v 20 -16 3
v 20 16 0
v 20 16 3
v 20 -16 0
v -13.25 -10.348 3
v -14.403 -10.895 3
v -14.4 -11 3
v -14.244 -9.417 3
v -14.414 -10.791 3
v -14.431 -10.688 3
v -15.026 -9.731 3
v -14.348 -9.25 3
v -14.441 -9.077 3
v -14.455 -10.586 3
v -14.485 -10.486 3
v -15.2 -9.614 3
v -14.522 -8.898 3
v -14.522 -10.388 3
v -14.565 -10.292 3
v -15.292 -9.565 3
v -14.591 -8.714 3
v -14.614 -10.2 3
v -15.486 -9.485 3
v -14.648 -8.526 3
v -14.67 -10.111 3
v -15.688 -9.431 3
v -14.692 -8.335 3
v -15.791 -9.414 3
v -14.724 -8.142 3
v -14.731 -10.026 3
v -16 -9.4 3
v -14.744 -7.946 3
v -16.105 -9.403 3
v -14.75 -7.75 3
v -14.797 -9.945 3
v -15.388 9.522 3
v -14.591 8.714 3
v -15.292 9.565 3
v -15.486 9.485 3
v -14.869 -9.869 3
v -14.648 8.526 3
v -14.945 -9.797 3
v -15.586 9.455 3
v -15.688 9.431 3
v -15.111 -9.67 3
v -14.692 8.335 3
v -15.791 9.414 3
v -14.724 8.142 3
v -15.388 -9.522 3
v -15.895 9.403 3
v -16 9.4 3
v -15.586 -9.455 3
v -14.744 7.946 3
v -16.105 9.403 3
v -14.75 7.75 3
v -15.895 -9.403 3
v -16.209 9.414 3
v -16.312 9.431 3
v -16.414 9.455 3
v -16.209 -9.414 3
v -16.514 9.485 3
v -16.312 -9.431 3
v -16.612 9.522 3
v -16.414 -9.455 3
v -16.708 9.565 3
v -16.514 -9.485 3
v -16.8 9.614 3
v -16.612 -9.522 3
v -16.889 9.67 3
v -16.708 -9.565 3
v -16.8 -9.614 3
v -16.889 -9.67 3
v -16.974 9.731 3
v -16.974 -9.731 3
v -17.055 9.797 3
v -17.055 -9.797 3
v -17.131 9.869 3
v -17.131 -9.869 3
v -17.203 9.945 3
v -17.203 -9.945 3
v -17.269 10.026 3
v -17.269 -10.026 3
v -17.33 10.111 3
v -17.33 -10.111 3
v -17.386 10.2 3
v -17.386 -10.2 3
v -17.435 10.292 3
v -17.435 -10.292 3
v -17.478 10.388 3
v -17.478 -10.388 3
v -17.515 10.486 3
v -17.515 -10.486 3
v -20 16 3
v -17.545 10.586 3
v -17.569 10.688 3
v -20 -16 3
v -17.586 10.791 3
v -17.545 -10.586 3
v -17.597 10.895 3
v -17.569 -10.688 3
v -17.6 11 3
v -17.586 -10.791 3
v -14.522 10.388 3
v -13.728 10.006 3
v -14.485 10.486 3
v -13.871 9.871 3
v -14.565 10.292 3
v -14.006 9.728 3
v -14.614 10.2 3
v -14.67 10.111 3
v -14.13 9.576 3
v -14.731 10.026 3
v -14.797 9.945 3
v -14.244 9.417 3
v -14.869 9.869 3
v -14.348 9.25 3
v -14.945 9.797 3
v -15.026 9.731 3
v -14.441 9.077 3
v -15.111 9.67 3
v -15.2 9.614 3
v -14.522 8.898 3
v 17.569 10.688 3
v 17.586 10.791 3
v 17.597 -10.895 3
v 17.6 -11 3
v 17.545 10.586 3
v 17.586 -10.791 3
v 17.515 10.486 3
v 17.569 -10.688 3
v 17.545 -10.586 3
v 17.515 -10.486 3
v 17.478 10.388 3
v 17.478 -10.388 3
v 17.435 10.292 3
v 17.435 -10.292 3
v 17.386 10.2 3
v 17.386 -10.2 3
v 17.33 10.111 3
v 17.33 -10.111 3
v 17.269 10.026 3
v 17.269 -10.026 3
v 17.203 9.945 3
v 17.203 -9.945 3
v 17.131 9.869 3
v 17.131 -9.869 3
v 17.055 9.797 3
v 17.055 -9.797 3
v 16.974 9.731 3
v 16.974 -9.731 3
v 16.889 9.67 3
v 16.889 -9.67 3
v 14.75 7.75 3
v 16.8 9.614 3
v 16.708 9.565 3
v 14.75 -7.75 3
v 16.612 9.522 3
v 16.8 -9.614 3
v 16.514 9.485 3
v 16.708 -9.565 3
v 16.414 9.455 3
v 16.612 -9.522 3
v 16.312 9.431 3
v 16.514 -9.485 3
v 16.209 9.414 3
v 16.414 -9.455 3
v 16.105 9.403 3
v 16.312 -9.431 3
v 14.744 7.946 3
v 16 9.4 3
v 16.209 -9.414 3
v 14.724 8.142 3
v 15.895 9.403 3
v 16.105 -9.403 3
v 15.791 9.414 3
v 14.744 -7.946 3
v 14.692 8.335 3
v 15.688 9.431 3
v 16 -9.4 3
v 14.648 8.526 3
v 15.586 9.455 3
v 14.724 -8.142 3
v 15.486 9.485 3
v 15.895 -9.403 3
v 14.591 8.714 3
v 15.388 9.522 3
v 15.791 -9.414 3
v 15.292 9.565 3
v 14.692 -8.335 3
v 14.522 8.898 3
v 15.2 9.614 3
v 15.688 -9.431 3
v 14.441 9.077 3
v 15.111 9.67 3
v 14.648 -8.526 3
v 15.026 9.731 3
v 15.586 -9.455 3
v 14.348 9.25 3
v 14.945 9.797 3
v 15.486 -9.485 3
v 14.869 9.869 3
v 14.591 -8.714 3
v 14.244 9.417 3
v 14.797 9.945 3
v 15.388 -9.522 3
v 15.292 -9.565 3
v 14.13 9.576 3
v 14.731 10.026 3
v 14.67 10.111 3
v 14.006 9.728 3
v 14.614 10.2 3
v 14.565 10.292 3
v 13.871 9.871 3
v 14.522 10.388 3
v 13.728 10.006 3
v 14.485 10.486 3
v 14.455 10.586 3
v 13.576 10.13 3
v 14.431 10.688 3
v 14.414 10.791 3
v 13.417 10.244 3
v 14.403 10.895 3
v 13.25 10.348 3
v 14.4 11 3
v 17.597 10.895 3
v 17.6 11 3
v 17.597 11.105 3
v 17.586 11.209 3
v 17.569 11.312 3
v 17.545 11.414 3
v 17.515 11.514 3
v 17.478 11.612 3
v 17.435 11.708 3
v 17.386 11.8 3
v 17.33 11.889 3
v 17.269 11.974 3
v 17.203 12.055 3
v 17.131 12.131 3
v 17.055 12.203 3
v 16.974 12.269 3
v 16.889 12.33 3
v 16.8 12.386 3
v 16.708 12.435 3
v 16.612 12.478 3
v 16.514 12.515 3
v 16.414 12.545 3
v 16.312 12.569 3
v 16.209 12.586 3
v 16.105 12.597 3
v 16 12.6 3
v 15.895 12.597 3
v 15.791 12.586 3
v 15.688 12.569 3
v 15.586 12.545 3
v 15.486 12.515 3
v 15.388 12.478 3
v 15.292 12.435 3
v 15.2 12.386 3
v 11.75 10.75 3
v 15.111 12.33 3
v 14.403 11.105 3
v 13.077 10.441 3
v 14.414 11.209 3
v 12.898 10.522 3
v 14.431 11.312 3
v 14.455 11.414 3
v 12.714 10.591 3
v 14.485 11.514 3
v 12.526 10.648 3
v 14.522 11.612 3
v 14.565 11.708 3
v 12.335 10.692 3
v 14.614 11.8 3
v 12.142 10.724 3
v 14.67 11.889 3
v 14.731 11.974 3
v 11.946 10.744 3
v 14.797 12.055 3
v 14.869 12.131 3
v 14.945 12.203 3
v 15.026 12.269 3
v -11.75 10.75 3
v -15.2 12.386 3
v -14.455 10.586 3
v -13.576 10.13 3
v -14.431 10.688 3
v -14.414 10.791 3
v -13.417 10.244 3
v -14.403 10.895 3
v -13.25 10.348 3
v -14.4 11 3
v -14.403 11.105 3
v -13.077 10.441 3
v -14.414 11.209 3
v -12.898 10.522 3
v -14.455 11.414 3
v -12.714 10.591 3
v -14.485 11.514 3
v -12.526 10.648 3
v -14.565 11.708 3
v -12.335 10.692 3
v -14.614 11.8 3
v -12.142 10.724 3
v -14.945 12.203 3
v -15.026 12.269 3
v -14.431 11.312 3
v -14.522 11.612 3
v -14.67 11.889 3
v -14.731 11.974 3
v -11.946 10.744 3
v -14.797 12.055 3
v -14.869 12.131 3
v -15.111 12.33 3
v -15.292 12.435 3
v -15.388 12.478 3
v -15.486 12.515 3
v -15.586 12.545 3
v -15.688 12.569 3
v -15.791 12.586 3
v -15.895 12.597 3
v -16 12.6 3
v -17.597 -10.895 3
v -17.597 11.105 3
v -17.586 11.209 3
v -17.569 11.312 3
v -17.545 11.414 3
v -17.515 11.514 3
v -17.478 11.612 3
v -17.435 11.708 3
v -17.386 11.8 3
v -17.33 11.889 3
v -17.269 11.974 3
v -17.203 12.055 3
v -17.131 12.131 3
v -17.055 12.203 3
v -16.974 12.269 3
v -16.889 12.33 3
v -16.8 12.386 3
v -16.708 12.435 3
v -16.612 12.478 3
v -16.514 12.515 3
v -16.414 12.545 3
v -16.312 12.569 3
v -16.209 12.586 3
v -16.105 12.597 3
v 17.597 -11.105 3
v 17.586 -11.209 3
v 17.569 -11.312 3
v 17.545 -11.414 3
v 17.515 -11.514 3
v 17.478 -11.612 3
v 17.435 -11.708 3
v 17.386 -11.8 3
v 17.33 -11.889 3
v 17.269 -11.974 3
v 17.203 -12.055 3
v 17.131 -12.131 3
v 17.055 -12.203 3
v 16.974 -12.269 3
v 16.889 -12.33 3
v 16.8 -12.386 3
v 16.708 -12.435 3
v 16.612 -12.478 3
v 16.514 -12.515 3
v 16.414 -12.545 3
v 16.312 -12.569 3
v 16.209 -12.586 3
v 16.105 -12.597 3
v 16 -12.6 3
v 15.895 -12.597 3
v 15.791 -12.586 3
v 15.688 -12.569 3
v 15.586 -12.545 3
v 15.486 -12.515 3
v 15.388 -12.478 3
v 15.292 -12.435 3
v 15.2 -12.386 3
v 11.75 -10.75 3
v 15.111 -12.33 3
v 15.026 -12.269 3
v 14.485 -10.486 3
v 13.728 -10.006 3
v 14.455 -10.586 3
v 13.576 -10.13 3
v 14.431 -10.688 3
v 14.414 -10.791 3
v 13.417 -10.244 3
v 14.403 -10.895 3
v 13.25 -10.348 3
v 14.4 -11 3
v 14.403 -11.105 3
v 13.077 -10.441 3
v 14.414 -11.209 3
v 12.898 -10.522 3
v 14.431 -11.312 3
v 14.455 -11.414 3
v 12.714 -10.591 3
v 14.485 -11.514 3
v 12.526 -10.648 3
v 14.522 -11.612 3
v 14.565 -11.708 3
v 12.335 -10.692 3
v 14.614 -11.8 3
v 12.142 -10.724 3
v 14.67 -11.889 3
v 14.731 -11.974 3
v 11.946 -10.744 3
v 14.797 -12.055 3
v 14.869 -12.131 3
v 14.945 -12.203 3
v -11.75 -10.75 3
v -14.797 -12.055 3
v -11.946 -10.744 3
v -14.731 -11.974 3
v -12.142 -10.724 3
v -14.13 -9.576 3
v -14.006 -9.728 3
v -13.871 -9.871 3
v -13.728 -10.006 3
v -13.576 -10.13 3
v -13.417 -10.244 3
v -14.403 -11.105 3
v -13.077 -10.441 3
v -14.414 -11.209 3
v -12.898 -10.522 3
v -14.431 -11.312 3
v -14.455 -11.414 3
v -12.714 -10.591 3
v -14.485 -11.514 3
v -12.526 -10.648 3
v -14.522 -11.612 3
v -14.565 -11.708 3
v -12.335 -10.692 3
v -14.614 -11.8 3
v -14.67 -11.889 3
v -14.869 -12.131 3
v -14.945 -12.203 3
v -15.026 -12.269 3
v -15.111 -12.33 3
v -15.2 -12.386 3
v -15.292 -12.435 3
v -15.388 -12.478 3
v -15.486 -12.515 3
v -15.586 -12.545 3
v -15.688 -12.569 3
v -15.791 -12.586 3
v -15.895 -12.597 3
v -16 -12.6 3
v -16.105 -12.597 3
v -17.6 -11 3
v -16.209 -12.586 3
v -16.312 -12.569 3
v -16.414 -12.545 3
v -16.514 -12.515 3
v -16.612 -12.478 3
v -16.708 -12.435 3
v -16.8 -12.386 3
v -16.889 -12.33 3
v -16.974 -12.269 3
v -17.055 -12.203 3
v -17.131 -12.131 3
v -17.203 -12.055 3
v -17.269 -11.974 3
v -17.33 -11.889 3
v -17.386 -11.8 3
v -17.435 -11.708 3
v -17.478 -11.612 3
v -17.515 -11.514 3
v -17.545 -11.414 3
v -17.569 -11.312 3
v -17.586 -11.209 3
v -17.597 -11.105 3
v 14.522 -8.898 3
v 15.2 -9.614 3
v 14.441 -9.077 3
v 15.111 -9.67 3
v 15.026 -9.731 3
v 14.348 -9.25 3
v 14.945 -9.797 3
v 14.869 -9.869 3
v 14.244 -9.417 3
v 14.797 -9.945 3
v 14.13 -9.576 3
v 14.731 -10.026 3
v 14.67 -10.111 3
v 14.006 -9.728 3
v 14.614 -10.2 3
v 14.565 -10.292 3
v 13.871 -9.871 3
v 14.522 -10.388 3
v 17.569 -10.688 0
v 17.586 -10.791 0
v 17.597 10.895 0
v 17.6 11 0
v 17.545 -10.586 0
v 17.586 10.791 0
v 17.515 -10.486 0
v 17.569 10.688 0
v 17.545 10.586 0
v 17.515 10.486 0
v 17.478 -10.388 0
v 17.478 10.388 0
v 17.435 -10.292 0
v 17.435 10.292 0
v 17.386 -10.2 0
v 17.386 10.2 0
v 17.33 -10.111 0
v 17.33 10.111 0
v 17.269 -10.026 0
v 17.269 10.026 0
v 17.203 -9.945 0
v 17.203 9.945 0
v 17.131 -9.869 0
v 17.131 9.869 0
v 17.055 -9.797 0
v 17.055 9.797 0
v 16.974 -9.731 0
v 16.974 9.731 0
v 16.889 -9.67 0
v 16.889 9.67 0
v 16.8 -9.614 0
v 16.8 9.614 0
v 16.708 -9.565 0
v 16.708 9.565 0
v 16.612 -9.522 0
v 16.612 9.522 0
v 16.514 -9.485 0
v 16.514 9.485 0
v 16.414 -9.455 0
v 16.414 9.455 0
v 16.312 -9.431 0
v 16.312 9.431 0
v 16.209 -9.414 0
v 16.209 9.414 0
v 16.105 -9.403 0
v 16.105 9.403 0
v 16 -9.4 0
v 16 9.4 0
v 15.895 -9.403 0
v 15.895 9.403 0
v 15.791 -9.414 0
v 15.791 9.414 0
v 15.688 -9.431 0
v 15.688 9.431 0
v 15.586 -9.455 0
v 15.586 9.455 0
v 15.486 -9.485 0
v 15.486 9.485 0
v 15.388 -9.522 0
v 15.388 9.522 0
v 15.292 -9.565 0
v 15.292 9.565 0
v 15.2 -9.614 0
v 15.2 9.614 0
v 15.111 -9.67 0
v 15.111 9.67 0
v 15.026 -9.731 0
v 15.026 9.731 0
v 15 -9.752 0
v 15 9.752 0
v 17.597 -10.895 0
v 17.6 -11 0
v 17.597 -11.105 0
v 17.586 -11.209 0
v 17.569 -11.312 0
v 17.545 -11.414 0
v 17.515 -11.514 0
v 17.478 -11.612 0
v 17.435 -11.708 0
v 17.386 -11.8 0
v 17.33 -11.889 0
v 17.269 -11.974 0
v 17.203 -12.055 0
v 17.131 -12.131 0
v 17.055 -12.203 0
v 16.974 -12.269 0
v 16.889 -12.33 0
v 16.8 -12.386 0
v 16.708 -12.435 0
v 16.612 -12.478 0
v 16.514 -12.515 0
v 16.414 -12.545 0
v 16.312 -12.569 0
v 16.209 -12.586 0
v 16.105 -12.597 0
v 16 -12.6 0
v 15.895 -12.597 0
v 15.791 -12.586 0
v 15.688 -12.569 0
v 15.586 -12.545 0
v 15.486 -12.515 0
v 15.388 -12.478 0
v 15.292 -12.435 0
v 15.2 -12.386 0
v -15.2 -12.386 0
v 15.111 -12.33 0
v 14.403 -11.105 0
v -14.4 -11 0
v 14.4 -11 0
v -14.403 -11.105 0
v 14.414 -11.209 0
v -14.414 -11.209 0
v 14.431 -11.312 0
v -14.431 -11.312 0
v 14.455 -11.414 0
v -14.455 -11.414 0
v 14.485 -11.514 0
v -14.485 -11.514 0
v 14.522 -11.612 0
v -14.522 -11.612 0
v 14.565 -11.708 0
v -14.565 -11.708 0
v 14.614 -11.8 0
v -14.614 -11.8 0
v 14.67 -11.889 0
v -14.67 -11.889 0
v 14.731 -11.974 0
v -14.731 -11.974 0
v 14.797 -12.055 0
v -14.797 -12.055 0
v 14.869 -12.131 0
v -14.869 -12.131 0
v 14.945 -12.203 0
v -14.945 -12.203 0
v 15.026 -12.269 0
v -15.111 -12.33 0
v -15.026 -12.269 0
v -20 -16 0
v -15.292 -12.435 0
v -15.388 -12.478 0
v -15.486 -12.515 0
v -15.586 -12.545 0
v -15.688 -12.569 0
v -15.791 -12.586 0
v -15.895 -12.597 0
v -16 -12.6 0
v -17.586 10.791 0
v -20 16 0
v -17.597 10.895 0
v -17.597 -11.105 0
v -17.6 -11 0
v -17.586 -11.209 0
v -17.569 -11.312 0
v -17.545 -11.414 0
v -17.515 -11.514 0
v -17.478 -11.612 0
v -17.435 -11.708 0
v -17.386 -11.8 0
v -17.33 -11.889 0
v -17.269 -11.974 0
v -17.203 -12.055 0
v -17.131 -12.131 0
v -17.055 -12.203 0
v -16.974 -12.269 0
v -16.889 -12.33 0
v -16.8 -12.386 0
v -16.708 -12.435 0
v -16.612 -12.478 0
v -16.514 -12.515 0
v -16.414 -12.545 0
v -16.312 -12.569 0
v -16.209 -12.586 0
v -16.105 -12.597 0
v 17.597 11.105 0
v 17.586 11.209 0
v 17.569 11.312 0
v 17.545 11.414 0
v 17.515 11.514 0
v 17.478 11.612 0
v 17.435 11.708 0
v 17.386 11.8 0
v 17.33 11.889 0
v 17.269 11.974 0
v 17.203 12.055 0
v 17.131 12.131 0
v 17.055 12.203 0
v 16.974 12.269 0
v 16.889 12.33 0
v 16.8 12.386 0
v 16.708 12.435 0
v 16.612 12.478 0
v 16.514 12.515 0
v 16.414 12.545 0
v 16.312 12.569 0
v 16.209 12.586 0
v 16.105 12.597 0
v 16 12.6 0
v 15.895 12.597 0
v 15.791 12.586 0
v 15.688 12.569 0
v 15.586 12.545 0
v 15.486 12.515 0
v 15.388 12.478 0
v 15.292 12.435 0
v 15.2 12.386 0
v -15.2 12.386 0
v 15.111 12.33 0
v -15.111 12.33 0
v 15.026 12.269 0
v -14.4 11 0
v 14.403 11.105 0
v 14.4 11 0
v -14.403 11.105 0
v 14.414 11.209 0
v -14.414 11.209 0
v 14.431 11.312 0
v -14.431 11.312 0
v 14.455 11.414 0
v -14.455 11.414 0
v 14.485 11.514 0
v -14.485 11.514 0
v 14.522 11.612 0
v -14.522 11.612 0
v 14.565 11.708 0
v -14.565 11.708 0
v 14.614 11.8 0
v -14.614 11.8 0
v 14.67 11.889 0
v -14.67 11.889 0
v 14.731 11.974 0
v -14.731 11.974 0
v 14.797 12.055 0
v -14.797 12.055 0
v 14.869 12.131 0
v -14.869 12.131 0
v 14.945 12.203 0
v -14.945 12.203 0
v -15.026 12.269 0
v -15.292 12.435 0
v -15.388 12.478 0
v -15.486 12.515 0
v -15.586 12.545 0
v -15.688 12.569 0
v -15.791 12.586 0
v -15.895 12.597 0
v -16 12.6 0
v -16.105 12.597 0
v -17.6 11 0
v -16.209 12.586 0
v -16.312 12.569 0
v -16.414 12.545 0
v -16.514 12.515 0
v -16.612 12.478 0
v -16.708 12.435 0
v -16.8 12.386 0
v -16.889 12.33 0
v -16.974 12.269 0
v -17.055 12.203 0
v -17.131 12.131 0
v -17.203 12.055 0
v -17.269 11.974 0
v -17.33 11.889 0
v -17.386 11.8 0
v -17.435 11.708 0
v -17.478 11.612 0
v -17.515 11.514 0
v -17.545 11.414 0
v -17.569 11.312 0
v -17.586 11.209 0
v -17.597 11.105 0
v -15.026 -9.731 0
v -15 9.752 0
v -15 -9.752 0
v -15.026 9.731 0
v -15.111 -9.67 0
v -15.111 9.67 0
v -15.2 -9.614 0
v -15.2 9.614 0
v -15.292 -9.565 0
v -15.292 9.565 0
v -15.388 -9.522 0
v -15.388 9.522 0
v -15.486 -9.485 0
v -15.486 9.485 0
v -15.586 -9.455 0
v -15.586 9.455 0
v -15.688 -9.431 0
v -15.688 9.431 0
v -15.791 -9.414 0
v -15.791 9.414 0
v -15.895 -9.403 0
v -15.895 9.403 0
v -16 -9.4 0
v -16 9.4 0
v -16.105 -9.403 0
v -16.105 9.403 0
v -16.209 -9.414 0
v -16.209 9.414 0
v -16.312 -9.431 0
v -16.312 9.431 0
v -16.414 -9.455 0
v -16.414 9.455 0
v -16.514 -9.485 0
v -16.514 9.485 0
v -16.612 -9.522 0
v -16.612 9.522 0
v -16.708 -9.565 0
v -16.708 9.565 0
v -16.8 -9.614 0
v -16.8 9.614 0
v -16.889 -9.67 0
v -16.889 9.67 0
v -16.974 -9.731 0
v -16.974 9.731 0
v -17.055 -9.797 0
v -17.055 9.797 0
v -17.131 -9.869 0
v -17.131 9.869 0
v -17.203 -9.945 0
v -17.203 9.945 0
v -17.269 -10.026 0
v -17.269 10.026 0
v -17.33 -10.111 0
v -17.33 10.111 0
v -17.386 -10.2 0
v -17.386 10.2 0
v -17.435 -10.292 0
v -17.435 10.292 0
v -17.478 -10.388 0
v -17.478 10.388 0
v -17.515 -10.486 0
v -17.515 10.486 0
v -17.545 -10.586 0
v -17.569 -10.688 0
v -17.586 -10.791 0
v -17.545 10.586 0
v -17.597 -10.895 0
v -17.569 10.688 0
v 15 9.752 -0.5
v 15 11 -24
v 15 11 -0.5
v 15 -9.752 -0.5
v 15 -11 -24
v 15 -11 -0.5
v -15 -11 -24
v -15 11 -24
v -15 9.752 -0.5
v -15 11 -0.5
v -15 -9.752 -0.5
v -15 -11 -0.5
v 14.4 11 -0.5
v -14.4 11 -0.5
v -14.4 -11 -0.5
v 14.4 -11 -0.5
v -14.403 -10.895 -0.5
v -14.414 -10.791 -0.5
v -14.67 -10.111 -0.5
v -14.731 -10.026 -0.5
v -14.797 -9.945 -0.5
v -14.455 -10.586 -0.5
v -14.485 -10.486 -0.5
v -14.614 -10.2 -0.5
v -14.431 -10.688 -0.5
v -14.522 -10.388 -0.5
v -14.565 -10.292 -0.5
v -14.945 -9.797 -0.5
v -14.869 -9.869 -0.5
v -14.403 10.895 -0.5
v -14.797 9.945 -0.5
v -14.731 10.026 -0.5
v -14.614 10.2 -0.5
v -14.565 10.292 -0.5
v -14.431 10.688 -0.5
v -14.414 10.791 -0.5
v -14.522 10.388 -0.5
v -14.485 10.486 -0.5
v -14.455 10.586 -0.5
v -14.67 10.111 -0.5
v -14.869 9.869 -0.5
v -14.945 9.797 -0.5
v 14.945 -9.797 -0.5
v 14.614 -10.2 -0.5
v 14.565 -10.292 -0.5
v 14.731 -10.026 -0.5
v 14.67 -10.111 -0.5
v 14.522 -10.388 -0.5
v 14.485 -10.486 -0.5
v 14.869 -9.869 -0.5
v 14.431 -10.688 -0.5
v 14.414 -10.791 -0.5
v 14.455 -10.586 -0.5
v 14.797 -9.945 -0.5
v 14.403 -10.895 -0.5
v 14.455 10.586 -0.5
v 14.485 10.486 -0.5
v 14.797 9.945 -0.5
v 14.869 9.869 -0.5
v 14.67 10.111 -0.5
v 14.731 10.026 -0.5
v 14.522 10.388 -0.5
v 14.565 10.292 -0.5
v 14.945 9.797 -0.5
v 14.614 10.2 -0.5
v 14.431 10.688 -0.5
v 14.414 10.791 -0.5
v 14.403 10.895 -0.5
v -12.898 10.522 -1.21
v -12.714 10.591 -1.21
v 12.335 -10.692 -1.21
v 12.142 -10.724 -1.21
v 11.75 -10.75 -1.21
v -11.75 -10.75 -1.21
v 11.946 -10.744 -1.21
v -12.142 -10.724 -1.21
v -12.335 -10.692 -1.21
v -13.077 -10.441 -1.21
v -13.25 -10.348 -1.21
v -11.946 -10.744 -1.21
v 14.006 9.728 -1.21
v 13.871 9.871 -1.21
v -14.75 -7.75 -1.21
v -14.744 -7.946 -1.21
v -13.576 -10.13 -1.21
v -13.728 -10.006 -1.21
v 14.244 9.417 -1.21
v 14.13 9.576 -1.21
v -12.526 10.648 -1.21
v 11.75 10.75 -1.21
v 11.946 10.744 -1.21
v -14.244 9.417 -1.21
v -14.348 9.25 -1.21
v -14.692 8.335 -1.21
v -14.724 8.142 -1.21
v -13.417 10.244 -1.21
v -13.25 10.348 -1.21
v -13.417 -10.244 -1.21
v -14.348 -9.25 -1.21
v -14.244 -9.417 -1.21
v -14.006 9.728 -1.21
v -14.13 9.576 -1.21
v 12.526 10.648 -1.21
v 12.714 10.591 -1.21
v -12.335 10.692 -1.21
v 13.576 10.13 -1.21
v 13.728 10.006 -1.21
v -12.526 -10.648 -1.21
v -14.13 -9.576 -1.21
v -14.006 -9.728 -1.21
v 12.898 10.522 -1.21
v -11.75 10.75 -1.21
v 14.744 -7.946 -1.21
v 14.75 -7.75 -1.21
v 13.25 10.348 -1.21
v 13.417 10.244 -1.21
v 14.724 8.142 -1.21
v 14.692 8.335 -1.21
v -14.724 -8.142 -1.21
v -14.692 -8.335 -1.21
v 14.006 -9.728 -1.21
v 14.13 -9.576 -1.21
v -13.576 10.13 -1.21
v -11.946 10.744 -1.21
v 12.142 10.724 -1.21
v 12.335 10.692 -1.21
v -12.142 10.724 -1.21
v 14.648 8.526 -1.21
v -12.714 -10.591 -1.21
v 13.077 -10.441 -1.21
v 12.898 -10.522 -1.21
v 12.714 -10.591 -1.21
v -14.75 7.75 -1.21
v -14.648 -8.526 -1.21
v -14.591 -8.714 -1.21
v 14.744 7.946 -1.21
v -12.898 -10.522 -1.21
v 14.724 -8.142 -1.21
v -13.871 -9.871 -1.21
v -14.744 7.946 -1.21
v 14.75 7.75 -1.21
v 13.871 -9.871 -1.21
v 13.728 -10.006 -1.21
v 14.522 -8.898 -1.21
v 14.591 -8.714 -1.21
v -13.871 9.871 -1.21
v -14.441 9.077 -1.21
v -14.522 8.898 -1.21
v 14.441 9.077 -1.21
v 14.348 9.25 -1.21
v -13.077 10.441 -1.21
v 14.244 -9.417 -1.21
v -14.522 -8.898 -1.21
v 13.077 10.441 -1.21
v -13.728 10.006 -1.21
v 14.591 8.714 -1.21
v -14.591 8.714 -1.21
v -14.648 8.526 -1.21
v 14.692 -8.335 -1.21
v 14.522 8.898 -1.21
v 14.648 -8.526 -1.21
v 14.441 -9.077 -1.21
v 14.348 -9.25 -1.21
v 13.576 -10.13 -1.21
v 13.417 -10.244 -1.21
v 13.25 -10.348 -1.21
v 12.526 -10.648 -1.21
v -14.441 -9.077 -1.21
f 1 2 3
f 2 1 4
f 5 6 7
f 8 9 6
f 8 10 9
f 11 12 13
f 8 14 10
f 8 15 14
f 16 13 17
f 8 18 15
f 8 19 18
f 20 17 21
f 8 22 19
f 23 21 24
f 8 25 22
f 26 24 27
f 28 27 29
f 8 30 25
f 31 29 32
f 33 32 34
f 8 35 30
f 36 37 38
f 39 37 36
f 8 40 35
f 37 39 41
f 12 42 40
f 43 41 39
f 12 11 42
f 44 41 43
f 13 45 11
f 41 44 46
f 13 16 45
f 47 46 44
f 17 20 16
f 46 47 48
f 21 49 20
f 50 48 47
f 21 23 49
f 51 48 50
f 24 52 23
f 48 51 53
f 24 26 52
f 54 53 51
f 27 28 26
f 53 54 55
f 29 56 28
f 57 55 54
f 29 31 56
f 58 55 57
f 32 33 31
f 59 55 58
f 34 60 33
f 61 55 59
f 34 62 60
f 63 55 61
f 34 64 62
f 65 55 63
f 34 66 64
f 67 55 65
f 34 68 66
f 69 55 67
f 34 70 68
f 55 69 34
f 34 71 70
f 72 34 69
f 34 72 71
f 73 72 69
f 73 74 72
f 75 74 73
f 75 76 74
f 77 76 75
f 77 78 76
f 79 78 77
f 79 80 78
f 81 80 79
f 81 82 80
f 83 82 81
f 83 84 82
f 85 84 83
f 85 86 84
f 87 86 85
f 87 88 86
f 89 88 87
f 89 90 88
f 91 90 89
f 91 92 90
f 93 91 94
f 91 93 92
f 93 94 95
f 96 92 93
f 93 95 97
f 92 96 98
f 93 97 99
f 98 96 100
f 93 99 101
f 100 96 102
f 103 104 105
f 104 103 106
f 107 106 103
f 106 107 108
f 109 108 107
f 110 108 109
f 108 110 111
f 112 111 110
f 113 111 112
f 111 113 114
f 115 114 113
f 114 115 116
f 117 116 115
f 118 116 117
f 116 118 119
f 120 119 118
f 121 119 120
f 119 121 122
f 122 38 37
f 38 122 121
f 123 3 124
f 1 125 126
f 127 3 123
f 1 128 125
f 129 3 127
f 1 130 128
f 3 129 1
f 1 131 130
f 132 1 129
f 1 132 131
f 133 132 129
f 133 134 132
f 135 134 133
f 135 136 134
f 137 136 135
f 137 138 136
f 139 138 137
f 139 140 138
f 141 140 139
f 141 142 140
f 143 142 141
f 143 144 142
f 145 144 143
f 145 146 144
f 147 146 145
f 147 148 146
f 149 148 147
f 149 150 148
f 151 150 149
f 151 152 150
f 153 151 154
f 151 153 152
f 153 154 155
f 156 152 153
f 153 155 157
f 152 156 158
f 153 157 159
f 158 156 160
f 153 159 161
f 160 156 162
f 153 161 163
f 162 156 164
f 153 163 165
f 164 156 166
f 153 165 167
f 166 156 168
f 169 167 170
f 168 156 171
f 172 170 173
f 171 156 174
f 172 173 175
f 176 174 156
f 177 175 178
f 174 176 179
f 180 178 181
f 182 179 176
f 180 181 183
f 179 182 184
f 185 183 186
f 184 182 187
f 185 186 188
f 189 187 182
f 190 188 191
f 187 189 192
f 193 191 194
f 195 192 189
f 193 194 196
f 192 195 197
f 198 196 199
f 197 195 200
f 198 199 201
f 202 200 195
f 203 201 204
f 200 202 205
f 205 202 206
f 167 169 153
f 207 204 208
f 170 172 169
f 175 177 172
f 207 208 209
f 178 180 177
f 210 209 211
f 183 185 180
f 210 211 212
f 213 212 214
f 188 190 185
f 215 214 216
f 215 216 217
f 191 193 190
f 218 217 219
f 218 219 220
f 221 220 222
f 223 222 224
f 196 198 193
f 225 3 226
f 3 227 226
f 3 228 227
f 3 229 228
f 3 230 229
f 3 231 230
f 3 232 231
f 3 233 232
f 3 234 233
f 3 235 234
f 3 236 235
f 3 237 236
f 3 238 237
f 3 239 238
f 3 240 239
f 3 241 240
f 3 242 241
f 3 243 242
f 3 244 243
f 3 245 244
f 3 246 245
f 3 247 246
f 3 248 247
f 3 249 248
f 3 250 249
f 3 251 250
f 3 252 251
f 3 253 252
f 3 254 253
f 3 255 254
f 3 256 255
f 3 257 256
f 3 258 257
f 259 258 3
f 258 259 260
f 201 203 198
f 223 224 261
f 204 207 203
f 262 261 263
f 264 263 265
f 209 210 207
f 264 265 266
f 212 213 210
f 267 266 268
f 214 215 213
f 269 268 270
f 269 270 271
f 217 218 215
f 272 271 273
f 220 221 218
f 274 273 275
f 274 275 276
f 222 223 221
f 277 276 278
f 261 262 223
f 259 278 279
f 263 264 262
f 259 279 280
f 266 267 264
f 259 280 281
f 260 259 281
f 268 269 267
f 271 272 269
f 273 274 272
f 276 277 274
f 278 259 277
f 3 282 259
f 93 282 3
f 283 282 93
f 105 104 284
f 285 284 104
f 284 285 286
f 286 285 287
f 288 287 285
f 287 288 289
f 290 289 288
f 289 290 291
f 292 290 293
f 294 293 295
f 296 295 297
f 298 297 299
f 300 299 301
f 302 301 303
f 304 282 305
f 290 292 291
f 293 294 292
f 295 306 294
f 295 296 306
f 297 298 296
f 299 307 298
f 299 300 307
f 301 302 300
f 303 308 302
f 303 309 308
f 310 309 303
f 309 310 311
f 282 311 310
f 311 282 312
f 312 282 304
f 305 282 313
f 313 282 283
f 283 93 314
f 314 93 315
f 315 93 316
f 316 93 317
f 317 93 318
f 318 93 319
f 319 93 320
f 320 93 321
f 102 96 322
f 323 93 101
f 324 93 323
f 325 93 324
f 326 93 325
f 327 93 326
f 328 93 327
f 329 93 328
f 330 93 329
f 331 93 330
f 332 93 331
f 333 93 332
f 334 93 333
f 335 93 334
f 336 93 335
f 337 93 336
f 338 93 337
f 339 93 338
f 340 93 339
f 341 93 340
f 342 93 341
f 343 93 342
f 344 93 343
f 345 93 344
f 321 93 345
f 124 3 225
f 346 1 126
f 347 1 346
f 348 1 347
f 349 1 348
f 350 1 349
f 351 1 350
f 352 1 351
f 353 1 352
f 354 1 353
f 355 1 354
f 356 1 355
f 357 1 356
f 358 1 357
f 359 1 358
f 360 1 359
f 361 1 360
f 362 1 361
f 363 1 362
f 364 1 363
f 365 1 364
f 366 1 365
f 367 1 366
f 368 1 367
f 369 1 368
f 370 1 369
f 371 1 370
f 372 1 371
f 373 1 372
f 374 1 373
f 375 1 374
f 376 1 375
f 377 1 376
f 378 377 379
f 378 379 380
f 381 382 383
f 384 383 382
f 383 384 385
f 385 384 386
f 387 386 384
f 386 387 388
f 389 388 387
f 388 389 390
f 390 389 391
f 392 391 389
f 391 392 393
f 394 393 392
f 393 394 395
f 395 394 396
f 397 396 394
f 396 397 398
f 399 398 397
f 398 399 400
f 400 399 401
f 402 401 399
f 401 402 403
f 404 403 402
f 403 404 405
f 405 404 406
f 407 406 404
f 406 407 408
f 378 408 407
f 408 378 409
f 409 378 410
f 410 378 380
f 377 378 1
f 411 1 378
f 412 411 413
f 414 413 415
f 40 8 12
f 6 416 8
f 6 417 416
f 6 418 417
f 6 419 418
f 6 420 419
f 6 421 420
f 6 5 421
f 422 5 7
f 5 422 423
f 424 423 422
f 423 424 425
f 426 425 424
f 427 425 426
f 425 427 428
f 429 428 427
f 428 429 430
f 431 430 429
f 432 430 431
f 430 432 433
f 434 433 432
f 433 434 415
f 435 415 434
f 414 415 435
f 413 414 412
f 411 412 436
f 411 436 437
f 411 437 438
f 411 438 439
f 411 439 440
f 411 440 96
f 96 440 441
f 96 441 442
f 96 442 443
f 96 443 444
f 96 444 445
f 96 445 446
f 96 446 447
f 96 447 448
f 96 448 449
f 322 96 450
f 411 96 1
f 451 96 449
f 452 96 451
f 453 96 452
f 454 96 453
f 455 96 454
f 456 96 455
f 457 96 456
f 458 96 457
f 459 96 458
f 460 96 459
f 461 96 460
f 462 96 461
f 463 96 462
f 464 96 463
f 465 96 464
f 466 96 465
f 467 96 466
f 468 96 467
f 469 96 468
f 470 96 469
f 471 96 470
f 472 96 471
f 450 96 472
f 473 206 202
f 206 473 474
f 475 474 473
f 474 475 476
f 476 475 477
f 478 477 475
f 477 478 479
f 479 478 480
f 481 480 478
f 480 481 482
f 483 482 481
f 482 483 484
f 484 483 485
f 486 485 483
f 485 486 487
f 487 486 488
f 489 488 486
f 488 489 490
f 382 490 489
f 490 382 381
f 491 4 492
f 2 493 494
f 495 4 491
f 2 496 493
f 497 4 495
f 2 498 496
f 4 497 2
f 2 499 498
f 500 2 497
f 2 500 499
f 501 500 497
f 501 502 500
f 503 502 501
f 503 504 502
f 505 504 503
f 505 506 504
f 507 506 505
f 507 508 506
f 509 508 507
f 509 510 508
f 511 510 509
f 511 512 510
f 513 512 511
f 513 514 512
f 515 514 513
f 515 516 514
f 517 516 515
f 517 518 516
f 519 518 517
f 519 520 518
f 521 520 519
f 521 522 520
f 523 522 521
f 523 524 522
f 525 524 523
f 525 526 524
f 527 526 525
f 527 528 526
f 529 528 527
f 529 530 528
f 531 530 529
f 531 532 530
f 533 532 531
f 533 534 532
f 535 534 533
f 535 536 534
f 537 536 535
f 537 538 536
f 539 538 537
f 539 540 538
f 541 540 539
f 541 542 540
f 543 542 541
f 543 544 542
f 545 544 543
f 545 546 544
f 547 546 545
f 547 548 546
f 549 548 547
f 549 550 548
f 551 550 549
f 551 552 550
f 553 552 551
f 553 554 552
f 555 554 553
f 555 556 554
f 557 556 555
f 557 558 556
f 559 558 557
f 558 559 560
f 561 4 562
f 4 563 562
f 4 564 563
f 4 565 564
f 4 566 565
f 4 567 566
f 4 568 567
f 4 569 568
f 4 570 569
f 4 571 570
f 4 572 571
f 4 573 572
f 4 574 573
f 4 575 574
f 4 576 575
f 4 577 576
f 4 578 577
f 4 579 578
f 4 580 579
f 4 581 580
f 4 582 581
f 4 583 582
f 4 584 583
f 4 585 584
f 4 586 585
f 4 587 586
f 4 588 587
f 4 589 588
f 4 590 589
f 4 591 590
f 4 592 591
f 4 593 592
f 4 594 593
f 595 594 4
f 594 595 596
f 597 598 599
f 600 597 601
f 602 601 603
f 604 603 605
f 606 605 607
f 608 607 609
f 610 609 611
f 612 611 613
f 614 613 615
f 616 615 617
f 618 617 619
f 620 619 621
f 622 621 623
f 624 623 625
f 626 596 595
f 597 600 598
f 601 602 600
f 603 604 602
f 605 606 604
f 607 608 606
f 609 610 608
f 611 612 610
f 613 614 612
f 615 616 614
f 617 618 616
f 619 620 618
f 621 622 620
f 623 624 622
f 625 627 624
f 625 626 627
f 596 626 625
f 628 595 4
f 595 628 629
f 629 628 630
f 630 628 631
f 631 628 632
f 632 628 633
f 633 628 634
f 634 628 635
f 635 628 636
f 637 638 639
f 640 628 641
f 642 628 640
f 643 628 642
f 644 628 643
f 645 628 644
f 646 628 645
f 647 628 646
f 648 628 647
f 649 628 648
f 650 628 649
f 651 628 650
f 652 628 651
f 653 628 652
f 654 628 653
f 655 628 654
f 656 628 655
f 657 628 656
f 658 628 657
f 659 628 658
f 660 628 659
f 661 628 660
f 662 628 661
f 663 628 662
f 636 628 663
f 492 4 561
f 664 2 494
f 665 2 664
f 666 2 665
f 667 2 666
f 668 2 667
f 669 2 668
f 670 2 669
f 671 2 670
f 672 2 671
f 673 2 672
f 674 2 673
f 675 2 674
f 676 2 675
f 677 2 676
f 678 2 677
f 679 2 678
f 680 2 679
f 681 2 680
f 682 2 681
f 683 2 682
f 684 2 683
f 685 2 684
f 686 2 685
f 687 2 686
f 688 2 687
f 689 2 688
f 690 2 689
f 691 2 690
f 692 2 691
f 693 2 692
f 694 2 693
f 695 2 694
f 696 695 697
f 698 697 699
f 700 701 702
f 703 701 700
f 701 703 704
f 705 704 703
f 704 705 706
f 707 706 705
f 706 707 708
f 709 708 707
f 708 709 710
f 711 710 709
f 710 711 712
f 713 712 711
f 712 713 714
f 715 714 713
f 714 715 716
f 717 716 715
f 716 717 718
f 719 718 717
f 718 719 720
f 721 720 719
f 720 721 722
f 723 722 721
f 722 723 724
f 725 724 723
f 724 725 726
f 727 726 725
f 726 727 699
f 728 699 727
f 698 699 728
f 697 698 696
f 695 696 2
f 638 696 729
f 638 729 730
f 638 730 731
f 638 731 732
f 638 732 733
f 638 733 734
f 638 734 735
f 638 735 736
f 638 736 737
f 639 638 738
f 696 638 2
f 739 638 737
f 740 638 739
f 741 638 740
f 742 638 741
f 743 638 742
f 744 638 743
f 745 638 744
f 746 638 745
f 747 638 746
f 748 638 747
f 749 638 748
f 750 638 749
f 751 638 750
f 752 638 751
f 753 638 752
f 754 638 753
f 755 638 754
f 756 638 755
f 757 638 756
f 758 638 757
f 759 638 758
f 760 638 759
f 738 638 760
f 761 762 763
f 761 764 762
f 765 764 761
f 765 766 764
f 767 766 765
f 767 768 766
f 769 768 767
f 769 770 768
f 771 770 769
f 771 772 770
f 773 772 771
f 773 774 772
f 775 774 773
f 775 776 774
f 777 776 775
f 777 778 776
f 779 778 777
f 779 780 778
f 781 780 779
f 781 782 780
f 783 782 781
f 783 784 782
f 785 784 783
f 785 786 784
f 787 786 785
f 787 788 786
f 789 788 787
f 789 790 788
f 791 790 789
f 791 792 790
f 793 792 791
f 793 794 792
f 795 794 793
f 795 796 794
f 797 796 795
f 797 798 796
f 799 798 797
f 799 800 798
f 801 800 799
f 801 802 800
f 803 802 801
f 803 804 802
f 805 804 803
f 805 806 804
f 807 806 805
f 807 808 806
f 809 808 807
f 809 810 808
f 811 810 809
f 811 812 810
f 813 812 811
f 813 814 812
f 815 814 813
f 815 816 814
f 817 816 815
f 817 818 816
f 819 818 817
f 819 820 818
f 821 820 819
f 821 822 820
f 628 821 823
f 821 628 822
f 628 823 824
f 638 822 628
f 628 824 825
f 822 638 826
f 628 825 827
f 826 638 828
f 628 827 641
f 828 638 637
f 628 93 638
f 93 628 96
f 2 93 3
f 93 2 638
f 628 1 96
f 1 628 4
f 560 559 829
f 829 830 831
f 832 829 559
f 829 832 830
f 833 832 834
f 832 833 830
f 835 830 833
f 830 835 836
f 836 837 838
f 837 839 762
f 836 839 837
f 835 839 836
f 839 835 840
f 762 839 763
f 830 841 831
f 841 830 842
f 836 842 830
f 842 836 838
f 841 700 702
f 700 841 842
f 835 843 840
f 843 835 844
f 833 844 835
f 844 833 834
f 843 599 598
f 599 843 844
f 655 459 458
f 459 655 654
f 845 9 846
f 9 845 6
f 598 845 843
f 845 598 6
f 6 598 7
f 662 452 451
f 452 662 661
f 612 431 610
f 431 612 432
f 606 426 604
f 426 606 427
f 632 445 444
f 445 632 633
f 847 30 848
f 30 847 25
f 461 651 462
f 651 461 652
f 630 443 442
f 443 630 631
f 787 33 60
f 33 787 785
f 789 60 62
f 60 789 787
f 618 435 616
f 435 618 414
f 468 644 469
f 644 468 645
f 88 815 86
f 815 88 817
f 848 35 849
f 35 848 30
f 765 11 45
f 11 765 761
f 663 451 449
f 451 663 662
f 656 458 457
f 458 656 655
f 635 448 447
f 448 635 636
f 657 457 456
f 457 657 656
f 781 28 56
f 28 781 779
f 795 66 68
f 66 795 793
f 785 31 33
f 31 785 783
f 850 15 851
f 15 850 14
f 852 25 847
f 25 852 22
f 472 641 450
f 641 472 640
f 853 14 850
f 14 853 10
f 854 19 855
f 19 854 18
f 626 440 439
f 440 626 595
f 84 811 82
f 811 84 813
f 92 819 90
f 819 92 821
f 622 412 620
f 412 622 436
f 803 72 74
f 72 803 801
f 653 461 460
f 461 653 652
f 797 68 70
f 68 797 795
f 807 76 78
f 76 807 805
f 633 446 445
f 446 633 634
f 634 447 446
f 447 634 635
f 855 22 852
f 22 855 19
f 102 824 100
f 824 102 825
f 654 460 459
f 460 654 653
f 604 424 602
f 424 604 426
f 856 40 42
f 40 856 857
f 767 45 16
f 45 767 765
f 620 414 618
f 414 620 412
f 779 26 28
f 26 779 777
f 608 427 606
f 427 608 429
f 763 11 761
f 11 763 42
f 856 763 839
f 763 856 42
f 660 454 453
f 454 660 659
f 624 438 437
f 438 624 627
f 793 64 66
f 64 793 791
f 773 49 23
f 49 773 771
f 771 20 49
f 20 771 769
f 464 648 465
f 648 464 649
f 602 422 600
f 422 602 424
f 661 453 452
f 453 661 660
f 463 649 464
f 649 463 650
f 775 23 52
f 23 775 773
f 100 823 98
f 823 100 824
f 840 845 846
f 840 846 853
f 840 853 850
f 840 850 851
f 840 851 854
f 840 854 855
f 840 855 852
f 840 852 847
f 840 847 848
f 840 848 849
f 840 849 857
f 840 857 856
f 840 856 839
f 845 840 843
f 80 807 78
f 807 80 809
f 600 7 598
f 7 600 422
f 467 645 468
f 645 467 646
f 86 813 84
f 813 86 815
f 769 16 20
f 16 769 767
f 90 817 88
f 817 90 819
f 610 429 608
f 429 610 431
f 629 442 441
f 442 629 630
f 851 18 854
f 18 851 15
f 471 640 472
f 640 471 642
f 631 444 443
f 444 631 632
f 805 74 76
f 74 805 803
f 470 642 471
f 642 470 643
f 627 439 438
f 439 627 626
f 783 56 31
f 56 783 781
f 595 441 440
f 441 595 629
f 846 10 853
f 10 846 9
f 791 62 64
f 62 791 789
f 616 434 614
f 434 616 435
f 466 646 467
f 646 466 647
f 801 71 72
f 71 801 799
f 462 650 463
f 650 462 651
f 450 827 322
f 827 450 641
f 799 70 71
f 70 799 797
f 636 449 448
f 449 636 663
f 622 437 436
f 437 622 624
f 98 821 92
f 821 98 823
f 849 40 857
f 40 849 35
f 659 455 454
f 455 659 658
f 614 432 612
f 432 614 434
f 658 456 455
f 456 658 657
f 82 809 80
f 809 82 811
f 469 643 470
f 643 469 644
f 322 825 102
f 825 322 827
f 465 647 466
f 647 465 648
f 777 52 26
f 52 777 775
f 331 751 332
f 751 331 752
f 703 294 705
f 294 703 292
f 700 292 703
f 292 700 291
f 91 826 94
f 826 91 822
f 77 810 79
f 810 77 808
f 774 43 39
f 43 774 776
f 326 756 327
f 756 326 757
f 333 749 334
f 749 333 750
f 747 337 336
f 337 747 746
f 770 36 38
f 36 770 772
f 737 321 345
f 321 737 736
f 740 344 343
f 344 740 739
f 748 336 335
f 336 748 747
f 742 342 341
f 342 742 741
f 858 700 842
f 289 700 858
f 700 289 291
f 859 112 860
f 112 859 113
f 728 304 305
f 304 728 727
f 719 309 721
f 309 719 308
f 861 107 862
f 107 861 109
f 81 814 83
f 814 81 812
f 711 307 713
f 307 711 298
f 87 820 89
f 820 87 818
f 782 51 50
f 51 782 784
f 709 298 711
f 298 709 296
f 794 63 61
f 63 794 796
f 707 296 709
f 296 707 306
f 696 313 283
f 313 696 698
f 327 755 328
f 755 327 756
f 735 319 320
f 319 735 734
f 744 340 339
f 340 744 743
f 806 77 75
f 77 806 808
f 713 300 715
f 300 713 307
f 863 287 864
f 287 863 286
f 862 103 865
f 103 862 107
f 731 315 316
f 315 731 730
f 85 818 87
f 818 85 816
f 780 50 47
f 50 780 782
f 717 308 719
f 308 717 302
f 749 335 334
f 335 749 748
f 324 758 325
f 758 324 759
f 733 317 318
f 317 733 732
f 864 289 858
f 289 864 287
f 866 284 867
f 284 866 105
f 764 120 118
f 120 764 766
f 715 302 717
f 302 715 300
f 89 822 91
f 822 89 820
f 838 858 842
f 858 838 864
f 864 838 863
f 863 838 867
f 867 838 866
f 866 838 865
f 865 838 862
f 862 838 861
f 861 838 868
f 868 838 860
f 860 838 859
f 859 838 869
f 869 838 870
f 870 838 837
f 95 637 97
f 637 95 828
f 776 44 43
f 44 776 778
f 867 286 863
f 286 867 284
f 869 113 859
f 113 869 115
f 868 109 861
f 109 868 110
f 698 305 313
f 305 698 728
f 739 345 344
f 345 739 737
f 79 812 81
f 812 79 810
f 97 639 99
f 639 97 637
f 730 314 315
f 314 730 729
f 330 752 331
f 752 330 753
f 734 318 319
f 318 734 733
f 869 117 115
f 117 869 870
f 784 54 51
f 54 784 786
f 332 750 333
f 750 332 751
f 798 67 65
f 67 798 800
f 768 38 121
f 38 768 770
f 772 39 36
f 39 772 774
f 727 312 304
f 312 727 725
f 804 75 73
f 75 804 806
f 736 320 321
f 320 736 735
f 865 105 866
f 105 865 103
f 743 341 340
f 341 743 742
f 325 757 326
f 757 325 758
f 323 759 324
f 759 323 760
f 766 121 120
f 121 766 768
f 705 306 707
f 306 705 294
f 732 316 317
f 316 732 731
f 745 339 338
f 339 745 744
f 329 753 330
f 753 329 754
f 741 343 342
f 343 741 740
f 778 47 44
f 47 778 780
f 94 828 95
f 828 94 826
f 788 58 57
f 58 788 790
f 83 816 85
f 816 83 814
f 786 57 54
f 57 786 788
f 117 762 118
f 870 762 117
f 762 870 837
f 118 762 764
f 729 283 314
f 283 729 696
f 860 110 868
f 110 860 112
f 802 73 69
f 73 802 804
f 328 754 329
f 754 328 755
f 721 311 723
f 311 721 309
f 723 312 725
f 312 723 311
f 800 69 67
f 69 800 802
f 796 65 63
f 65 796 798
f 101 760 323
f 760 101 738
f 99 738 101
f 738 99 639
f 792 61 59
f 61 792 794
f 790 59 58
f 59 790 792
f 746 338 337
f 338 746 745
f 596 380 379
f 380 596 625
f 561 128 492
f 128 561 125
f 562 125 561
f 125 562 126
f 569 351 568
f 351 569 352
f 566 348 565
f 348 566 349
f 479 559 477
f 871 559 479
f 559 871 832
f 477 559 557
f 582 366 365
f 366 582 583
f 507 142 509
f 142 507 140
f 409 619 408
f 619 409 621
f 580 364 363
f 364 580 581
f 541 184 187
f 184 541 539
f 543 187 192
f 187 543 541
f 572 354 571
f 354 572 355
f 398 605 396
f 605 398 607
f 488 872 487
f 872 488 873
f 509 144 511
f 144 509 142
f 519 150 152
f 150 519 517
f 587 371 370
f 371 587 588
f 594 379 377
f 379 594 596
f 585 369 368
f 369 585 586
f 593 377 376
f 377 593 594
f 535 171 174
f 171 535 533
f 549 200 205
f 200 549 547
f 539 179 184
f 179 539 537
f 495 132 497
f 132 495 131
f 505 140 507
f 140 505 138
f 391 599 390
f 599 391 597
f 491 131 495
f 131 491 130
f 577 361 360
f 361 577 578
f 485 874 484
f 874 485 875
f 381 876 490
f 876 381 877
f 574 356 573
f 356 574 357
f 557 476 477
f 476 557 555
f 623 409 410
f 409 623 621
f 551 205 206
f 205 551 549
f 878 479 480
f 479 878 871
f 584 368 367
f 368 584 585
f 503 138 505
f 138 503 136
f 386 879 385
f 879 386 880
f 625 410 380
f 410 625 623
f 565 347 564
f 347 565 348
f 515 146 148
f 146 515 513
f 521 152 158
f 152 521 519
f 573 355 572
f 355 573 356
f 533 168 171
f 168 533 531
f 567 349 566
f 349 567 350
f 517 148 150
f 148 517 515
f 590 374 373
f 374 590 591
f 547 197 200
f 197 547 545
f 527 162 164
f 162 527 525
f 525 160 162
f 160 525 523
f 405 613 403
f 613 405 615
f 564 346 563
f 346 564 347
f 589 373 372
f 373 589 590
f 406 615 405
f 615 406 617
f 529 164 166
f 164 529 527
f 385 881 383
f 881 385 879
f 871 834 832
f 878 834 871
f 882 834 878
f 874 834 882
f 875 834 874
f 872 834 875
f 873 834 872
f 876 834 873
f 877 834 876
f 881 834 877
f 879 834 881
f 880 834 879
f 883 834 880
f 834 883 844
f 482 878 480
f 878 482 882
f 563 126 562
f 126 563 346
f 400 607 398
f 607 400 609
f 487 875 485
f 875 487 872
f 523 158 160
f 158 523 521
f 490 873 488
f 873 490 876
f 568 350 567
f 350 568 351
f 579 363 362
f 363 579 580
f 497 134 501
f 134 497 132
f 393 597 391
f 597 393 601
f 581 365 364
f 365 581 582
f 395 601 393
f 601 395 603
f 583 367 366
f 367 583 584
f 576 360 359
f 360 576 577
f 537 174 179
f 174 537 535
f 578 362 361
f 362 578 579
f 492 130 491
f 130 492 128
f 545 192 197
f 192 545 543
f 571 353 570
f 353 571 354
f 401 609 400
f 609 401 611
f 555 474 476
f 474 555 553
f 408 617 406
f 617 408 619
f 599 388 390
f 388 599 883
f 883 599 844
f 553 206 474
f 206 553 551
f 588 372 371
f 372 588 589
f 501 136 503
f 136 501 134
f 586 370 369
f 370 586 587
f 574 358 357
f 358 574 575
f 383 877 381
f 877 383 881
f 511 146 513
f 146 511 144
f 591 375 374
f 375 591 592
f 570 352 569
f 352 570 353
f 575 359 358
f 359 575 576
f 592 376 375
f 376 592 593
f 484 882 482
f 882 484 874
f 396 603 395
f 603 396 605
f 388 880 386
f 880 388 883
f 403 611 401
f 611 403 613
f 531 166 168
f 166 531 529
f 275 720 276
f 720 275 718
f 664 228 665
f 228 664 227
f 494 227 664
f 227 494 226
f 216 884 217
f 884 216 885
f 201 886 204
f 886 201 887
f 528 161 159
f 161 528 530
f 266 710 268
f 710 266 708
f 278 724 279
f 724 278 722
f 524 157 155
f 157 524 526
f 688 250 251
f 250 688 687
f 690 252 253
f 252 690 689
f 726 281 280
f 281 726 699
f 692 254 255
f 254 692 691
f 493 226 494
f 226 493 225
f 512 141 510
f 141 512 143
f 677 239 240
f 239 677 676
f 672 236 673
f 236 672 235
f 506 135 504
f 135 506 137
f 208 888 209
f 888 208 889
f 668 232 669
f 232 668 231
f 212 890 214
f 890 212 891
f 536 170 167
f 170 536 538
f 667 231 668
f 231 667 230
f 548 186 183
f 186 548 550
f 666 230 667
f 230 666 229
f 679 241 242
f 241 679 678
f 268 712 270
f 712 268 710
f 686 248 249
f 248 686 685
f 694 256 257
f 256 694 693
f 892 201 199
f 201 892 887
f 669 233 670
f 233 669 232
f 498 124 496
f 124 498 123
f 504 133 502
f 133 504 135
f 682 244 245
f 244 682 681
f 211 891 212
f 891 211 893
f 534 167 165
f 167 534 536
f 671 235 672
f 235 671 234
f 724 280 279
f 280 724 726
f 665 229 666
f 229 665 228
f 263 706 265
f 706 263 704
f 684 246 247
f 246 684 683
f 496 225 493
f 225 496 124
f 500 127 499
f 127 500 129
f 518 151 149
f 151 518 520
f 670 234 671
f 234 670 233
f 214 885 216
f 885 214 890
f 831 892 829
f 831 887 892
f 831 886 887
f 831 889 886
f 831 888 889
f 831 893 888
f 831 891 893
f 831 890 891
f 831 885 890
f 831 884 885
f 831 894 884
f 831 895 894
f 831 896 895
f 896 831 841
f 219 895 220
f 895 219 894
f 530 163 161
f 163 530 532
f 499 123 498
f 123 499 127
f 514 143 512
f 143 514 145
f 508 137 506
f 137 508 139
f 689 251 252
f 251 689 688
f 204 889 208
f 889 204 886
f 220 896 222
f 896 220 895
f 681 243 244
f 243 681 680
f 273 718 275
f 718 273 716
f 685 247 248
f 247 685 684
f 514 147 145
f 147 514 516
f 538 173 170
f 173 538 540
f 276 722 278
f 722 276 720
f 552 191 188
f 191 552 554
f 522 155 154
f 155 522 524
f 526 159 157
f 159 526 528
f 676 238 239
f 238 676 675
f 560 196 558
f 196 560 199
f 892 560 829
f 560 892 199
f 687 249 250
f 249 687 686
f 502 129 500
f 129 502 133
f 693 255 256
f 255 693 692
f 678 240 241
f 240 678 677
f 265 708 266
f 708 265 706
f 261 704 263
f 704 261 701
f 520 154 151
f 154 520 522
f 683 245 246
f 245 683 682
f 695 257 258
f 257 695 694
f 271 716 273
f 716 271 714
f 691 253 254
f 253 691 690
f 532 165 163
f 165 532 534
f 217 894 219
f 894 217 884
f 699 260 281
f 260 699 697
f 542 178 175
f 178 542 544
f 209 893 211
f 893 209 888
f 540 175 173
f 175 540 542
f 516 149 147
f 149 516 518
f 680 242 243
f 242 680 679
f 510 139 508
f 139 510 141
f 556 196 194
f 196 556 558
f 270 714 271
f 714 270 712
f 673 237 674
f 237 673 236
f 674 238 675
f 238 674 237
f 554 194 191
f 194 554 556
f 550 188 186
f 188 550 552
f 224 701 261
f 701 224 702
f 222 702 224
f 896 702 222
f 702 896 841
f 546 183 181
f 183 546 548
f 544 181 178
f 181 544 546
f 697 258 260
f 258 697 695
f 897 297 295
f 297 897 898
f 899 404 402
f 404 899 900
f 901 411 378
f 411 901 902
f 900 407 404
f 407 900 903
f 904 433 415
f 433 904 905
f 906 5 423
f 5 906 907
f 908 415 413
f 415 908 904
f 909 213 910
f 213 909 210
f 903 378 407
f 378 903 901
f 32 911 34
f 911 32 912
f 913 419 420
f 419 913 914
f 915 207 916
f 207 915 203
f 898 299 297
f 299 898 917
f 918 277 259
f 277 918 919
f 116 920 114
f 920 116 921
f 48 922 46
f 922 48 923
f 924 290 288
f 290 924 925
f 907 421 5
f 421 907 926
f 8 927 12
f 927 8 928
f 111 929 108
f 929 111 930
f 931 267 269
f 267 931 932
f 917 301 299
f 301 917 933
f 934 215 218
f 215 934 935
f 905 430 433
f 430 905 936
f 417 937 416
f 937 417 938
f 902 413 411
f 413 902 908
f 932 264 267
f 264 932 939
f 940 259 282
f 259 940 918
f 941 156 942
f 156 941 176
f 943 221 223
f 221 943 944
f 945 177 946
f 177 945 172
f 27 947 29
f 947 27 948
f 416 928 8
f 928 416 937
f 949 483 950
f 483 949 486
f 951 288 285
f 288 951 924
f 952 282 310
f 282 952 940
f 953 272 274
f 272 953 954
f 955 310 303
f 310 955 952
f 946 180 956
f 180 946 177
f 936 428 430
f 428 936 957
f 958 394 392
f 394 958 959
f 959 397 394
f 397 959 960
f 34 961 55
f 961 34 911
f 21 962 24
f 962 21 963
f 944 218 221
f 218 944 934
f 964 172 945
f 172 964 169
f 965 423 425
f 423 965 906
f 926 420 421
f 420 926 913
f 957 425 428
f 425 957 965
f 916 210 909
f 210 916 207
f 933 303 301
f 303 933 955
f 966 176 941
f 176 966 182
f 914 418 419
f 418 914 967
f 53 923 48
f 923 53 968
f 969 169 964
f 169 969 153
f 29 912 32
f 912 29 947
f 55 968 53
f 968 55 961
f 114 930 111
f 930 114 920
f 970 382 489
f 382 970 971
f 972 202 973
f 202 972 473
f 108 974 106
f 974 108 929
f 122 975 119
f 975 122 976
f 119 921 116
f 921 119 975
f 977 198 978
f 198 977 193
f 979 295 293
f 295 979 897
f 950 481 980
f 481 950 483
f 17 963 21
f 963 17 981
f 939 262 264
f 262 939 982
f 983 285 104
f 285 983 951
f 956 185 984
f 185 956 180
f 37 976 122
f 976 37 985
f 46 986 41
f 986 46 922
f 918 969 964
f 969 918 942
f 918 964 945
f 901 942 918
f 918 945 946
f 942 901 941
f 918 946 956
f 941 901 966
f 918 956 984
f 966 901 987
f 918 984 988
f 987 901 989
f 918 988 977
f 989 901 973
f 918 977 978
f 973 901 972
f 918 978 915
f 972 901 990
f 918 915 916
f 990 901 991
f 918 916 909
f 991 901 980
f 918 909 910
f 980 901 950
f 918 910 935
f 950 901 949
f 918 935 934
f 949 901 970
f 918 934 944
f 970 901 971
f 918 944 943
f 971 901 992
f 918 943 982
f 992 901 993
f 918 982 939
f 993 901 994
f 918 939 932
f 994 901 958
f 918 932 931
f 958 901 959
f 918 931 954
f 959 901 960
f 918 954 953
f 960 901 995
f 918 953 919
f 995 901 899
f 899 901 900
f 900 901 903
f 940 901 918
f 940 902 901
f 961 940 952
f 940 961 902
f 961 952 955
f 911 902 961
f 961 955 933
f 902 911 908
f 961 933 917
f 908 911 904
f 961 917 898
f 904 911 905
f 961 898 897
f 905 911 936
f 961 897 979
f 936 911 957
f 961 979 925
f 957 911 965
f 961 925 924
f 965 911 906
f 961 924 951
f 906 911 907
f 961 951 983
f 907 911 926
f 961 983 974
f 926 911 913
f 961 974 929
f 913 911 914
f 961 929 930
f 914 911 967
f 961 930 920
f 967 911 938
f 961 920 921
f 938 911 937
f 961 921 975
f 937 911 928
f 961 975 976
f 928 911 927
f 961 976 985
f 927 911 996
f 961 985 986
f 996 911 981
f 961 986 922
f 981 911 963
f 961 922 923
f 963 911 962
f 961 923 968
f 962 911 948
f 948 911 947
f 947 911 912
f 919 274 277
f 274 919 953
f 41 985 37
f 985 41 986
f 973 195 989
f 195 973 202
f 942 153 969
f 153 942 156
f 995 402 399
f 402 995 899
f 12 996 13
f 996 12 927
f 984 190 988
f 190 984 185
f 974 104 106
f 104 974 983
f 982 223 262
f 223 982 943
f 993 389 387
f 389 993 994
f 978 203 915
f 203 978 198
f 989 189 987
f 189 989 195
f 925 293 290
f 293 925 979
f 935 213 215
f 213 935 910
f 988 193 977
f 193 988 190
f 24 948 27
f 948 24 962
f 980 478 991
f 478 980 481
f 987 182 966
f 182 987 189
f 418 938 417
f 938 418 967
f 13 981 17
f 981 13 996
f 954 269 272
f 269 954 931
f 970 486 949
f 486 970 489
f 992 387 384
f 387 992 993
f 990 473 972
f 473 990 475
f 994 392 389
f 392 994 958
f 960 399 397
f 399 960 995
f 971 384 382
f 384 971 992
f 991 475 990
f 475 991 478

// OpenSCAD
$fn=96;

// IEC power inlet module (approx. RS 811-7193 style)
// Overall faceplate: 40 x 32 mm
// Includes: faceplate, recessed body, flange screw holes, and IEC C14-ish cutout opening.

module iec_inlet_module(
    plate_w=40.0,
    plate_h=32.0,
    plate_t=3.0,

    body_w=30.0,
    body_h=22.0,
    body_d=24.0,          // depth behind plate

    recess=1.2,           // front recess depth for the opening
    opening_w=27.5,       // IEC opening (approx)
    opening_h=19.5,
    opening_r=2.0,

    // flange screw holes (approx positions)
    hole_d=3.2,
    hole_x=16.0,          // from center to hole in X
    hole_y=11.0           // from center to hole in Y
){
    difference() {
        union() {
            // Faceplate
            translate([-plate_w/2, -plate_h/2, 0])
                cube([plate_w, plate_h, plate_t], center=false);

            // Rear body (centered)
            translate([-body_w/2, -body_h/2, -body_d])
                cube([body_w, body_h, body_d], center=false);
        }

        // Main opening through plate + a bit into body
        translate([0,0,-0.01])
            rounded_rect_hole(opening_w, opening_h, opening_r, plate_t + recess + 0.02);

        // Slightly larger relief behind opening (helps resemble molded inlet cavity)
        translate([0,0,-(recess+0.01)])
            rounded_rect_hole(opening_w+2.0, opening_h+2.0, opening_r+1.0, body_d + recess + 0.02);

        // Screw holes through plate
        for (sx=[-1,1], sy=[-1,1]) {
            translate([sx*hole_x, sy*hole_y, -0.5])
                cylinder(d=hole_d, h=plate_t+1.0);
        }
    }
}

// Helper: rounded rectangle "hole" extruded along Z
module rounded_rect_hole(w,h,r,depth){
    r2 = min(r, min(w,h)/2);
    linear_extrude(height=depth)
        offset(r=r2)
            square([w-2*r2, h-2*r2], center=true);
}

iec_inlet_module();
